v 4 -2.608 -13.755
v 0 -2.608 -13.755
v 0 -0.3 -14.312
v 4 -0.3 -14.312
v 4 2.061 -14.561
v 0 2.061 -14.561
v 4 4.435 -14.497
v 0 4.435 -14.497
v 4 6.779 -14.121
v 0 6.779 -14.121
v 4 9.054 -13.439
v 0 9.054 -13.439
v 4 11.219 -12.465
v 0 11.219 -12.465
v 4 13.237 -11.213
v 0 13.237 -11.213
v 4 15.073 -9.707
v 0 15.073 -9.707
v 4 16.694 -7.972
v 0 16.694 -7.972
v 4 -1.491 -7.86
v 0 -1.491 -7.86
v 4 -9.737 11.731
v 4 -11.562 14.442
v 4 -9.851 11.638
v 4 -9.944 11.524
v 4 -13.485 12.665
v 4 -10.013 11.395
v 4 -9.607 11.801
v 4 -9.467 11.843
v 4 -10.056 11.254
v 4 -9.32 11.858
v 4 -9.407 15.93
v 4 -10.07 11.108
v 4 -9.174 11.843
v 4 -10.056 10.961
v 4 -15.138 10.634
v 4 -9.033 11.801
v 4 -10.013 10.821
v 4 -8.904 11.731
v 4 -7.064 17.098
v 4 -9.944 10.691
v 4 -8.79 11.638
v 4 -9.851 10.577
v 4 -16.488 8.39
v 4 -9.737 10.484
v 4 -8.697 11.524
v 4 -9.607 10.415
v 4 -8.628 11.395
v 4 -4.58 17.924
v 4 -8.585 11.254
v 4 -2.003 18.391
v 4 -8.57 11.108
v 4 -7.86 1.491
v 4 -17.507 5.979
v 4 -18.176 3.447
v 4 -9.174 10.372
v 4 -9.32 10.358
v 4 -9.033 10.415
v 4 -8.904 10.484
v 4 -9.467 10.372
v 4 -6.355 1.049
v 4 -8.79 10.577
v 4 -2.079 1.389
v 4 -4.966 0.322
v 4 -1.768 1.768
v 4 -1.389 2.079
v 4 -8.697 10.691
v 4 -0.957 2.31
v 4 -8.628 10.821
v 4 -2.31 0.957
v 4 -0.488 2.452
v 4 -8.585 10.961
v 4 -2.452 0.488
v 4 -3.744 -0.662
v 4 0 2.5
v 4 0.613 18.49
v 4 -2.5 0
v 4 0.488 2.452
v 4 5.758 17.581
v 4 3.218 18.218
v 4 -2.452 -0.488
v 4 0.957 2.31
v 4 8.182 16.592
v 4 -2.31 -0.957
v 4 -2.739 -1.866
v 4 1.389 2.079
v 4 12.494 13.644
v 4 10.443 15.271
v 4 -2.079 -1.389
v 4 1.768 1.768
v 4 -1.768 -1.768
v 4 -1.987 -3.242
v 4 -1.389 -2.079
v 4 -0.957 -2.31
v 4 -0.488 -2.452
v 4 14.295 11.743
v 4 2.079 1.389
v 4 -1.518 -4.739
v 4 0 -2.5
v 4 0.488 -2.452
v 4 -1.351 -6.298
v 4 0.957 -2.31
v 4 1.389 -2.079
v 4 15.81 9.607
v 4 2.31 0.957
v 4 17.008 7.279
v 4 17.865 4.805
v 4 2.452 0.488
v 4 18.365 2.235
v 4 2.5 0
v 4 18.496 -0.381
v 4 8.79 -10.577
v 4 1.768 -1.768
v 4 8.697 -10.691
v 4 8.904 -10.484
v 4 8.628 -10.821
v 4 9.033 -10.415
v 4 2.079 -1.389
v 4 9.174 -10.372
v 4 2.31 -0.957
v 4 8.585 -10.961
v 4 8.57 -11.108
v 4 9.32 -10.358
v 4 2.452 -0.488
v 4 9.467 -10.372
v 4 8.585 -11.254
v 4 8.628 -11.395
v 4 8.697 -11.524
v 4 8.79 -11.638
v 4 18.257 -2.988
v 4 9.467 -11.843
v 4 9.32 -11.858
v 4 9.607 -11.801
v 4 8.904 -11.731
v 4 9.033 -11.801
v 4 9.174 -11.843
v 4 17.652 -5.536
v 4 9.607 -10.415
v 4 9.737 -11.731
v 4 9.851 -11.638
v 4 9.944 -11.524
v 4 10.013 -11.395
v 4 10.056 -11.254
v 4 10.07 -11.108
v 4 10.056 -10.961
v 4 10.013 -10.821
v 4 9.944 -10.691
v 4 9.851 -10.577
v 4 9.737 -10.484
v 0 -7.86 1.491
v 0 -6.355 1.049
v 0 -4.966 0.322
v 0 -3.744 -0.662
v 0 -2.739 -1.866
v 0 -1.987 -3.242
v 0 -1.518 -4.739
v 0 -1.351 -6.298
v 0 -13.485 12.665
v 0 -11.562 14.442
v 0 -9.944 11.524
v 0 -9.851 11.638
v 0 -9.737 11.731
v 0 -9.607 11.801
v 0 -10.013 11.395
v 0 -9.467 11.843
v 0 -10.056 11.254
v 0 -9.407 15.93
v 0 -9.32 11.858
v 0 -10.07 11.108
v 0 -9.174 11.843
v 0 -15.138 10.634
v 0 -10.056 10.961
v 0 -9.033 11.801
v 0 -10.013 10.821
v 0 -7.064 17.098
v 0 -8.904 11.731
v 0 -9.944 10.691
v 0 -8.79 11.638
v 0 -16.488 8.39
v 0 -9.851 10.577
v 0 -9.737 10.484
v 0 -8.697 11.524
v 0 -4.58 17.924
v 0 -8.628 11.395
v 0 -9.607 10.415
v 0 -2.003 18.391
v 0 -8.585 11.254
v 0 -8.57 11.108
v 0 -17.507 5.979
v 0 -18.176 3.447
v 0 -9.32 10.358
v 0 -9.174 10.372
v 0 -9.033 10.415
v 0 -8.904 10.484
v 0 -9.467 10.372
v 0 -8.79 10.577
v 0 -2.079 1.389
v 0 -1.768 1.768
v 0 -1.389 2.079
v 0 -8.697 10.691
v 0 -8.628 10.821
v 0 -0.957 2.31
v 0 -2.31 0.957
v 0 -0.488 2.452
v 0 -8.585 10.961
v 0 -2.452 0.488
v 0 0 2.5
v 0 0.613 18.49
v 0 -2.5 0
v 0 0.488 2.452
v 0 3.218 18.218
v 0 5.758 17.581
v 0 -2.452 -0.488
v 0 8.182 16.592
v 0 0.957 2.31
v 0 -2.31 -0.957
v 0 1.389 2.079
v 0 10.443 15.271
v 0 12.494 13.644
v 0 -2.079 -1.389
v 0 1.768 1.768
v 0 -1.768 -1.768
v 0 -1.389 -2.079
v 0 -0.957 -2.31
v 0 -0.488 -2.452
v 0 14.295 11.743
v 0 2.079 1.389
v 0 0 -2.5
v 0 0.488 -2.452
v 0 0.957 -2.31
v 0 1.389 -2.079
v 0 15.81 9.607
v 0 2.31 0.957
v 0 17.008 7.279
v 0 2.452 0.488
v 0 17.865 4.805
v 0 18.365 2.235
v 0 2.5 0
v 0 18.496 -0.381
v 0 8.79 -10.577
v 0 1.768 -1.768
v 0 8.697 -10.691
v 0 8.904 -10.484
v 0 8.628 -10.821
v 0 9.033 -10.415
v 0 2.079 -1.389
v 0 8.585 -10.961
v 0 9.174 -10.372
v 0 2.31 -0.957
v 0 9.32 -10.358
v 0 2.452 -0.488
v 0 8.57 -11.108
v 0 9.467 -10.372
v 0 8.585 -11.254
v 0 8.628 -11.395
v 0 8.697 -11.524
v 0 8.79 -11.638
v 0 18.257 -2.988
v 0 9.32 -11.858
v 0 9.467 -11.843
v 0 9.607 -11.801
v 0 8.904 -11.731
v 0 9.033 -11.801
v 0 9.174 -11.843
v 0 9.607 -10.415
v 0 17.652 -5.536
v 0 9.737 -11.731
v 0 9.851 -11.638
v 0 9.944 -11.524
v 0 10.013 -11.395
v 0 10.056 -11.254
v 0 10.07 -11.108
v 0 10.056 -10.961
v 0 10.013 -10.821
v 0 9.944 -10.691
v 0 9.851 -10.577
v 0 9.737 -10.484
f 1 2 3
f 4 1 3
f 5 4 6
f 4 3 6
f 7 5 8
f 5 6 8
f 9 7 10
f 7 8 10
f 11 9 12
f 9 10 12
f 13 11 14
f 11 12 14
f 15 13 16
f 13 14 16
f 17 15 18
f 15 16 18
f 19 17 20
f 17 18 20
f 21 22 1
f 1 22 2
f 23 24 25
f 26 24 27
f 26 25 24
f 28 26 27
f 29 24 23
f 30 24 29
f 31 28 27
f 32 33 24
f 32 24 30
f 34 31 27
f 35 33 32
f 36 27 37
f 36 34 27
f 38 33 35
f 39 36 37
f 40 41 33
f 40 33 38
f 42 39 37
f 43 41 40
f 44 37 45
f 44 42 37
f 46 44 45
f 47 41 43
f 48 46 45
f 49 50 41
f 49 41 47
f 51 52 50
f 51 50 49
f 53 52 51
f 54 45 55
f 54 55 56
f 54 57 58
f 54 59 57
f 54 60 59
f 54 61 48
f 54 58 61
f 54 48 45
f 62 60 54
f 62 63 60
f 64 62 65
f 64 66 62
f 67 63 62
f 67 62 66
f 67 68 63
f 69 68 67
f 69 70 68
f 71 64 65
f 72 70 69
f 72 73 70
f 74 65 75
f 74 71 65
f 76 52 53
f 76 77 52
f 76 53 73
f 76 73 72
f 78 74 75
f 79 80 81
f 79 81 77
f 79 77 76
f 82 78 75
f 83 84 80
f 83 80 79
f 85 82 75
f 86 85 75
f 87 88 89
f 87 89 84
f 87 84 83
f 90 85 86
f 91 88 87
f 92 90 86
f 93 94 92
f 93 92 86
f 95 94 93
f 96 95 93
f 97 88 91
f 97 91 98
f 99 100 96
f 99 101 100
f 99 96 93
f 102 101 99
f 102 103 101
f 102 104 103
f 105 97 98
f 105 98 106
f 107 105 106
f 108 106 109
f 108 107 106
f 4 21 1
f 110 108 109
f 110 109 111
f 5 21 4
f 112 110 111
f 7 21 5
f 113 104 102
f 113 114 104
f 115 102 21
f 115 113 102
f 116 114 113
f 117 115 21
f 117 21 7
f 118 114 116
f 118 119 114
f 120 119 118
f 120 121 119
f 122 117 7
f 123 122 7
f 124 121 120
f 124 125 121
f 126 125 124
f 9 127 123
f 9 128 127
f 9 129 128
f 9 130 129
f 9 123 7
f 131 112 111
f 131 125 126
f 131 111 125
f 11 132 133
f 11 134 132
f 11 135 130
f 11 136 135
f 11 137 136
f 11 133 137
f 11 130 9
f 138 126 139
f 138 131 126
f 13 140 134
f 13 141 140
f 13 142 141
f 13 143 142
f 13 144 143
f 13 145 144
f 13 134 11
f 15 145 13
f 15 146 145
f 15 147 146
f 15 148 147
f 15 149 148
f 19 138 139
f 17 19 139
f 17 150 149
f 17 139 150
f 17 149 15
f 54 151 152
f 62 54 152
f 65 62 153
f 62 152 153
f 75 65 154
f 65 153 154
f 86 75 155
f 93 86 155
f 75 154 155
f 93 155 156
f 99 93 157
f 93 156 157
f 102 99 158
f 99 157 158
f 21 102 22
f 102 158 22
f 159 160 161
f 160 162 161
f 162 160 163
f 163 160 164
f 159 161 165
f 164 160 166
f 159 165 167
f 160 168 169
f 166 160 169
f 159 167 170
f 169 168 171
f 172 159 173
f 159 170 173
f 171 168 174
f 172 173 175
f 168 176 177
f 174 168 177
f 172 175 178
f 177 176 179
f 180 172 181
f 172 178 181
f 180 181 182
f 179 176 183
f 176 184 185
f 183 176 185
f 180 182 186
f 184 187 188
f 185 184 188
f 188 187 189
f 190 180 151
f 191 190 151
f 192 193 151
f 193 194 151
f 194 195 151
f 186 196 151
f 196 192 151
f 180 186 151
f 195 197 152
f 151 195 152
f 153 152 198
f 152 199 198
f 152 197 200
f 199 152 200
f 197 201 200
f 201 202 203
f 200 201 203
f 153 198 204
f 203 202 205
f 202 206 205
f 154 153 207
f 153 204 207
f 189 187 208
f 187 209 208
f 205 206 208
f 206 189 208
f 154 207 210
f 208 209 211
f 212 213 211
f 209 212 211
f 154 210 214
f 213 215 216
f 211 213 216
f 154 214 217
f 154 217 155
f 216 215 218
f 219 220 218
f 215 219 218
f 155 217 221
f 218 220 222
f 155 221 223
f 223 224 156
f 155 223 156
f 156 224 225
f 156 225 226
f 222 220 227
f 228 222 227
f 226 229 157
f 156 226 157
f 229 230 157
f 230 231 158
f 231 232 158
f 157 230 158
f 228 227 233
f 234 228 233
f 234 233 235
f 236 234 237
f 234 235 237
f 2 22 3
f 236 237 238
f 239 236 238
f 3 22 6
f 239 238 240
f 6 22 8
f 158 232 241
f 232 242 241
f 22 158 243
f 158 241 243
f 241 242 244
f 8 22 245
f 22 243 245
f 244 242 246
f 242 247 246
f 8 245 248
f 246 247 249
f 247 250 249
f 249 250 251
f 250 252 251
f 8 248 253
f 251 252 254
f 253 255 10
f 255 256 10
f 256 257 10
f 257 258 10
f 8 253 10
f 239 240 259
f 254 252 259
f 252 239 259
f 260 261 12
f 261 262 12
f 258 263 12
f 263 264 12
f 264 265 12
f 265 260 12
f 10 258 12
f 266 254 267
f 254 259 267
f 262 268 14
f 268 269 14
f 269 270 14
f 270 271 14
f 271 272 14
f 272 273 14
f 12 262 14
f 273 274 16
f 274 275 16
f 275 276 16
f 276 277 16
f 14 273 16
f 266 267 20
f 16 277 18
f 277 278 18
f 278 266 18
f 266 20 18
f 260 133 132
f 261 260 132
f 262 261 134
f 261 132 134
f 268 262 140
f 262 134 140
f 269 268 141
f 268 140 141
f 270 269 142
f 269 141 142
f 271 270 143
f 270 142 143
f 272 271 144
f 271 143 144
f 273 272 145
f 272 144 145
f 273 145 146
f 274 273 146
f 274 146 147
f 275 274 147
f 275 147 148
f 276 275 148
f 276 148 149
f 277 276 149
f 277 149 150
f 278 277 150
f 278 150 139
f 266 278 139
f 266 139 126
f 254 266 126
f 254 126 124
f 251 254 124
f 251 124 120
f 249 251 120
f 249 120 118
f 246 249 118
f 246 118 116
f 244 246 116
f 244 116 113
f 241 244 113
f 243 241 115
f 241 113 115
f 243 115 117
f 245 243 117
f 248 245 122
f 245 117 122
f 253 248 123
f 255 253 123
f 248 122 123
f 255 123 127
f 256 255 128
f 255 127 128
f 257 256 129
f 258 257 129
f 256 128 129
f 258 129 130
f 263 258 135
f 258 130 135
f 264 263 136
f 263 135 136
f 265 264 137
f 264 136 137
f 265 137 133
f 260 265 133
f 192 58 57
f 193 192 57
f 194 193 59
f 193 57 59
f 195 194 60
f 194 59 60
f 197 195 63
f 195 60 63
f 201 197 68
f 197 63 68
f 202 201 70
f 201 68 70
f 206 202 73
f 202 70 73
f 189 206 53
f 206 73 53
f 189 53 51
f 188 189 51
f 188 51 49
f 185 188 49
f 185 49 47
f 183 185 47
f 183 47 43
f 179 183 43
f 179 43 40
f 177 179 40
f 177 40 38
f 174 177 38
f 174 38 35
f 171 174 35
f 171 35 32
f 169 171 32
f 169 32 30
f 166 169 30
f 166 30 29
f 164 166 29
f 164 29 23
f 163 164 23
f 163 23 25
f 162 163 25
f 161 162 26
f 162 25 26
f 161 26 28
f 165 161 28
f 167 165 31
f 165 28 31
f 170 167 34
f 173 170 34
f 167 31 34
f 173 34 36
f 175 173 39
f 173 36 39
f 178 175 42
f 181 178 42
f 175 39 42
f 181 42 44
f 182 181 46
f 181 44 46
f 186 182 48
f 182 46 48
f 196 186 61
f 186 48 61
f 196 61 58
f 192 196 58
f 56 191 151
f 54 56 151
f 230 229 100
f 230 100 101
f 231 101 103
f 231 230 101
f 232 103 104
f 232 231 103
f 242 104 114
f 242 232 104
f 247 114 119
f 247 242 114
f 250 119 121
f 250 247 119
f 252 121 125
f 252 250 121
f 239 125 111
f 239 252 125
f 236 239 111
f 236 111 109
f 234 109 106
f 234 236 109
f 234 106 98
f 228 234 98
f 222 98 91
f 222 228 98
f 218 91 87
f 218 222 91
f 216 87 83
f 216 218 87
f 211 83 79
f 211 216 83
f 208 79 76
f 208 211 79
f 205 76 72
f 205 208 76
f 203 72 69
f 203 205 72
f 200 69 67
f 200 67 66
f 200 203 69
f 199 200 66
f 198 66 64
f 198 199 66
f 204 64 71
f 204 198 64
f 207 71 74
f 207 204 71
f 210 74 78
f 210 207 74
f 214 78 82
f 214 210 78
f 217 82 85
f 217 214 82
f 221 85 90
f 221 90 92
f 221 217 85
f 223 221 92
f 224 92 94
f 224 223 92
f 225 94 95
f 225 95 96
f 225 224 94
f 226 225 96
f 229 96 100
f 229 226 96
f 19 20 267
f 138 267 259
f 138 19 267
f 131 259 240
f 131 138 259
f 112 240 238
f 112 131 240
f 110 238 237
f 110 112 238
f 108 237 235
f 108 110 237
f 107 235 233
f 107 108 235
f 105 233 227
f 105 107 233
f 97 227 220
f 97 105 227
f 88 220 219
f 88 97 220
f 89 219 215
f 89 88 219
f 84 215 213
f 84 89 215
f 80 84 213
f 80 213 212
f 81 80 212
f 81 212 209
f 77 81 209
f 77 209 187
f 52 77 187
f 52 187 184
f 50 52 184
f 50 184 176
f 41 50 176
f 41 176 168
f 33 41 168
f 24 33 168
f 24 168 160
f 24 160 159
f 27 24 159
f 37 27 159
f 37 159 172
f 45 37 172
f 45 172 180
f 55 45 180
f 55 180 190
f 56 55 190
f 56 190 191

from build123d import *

# Parameters (mm, degrees)
SKETCH_1_R          = 2.5
EXTRUDE_1_DEPTH     = 4
SKETCH_2_R          = 0.75
CUT_EXTRUDE_1_DEPTH = 10
SKETCH_3_R          = 25.464829655
SKETCH_3_R_2        = 18.5
CUT_EXTRUDE_2_DEPTH = 10


with BuildPart() as part:
    # Эскиз1 → Бобышка-Вытянуть1 (new body)
    with BuildSketch(Plane(origin=(0, 0, 0), x_dir=(0, 0, -1), z_dir=(1, 0, 0))):
        with BuildLine():
            Line((7.85991422, -1.49055335), (13.754849795, -2.608468346))
            ThreePointArc((13.754849795, -2.608468346), (13.231778891, 9.584616389), (5.051373997, 18.641431188))
            ThreePointArc((5.051373997, 18.641431188), (-18.822494325, 4.328168593), (-3.59851409, -18.975511385))
            Line((-3.59851409, -18.975511385), (-1.490553351, -7.859914224))
            ThreePointArc((-1.490553351, -7.859914224), (1.865542593, -2.738688528), (7.85991422, -1.49055335))
        make_face()
        Circle(SKETCH_1_R, mode=Mode.SUBTRACT)
    extrude(amount=EXTRUDE_1_DEPTH)

    # Эскиз2 → Вырез-Вытянуть1 (cut)
    with BuildSketch(Plane(origin=(4, 0, 0), x_dir=(0, 0, -1), z_dir=(1, 0, 0))):
        with Locations((-11.107644425, -9.32042034)):
            Circle(SKETCH_2_R)
        with Locations((11.107644425, 9.32042034)):
            Circle(SKETCH_2_R)
    extrude(amount=-CUT_EXTRUDE_1_DEPTH, mode=Mode.SUBTRACT)

    # Эскиз3 → Вырез-Вытянуть2 (cut)
    with BuildSketch(Plane(origin=(4, 0, 0), x_dir=(0, 0, -1), z_dir=(1, 0, 0))):
        Circle(SKETCH_3_R)
        Circle(SKETCH_3_R_2, mode=Mode.SUBTRACT)
    extrude(amount=-CUT_EXTRUDE_2_DEPTH, mode=Mode.SUBTRACT)


solid = part.part
